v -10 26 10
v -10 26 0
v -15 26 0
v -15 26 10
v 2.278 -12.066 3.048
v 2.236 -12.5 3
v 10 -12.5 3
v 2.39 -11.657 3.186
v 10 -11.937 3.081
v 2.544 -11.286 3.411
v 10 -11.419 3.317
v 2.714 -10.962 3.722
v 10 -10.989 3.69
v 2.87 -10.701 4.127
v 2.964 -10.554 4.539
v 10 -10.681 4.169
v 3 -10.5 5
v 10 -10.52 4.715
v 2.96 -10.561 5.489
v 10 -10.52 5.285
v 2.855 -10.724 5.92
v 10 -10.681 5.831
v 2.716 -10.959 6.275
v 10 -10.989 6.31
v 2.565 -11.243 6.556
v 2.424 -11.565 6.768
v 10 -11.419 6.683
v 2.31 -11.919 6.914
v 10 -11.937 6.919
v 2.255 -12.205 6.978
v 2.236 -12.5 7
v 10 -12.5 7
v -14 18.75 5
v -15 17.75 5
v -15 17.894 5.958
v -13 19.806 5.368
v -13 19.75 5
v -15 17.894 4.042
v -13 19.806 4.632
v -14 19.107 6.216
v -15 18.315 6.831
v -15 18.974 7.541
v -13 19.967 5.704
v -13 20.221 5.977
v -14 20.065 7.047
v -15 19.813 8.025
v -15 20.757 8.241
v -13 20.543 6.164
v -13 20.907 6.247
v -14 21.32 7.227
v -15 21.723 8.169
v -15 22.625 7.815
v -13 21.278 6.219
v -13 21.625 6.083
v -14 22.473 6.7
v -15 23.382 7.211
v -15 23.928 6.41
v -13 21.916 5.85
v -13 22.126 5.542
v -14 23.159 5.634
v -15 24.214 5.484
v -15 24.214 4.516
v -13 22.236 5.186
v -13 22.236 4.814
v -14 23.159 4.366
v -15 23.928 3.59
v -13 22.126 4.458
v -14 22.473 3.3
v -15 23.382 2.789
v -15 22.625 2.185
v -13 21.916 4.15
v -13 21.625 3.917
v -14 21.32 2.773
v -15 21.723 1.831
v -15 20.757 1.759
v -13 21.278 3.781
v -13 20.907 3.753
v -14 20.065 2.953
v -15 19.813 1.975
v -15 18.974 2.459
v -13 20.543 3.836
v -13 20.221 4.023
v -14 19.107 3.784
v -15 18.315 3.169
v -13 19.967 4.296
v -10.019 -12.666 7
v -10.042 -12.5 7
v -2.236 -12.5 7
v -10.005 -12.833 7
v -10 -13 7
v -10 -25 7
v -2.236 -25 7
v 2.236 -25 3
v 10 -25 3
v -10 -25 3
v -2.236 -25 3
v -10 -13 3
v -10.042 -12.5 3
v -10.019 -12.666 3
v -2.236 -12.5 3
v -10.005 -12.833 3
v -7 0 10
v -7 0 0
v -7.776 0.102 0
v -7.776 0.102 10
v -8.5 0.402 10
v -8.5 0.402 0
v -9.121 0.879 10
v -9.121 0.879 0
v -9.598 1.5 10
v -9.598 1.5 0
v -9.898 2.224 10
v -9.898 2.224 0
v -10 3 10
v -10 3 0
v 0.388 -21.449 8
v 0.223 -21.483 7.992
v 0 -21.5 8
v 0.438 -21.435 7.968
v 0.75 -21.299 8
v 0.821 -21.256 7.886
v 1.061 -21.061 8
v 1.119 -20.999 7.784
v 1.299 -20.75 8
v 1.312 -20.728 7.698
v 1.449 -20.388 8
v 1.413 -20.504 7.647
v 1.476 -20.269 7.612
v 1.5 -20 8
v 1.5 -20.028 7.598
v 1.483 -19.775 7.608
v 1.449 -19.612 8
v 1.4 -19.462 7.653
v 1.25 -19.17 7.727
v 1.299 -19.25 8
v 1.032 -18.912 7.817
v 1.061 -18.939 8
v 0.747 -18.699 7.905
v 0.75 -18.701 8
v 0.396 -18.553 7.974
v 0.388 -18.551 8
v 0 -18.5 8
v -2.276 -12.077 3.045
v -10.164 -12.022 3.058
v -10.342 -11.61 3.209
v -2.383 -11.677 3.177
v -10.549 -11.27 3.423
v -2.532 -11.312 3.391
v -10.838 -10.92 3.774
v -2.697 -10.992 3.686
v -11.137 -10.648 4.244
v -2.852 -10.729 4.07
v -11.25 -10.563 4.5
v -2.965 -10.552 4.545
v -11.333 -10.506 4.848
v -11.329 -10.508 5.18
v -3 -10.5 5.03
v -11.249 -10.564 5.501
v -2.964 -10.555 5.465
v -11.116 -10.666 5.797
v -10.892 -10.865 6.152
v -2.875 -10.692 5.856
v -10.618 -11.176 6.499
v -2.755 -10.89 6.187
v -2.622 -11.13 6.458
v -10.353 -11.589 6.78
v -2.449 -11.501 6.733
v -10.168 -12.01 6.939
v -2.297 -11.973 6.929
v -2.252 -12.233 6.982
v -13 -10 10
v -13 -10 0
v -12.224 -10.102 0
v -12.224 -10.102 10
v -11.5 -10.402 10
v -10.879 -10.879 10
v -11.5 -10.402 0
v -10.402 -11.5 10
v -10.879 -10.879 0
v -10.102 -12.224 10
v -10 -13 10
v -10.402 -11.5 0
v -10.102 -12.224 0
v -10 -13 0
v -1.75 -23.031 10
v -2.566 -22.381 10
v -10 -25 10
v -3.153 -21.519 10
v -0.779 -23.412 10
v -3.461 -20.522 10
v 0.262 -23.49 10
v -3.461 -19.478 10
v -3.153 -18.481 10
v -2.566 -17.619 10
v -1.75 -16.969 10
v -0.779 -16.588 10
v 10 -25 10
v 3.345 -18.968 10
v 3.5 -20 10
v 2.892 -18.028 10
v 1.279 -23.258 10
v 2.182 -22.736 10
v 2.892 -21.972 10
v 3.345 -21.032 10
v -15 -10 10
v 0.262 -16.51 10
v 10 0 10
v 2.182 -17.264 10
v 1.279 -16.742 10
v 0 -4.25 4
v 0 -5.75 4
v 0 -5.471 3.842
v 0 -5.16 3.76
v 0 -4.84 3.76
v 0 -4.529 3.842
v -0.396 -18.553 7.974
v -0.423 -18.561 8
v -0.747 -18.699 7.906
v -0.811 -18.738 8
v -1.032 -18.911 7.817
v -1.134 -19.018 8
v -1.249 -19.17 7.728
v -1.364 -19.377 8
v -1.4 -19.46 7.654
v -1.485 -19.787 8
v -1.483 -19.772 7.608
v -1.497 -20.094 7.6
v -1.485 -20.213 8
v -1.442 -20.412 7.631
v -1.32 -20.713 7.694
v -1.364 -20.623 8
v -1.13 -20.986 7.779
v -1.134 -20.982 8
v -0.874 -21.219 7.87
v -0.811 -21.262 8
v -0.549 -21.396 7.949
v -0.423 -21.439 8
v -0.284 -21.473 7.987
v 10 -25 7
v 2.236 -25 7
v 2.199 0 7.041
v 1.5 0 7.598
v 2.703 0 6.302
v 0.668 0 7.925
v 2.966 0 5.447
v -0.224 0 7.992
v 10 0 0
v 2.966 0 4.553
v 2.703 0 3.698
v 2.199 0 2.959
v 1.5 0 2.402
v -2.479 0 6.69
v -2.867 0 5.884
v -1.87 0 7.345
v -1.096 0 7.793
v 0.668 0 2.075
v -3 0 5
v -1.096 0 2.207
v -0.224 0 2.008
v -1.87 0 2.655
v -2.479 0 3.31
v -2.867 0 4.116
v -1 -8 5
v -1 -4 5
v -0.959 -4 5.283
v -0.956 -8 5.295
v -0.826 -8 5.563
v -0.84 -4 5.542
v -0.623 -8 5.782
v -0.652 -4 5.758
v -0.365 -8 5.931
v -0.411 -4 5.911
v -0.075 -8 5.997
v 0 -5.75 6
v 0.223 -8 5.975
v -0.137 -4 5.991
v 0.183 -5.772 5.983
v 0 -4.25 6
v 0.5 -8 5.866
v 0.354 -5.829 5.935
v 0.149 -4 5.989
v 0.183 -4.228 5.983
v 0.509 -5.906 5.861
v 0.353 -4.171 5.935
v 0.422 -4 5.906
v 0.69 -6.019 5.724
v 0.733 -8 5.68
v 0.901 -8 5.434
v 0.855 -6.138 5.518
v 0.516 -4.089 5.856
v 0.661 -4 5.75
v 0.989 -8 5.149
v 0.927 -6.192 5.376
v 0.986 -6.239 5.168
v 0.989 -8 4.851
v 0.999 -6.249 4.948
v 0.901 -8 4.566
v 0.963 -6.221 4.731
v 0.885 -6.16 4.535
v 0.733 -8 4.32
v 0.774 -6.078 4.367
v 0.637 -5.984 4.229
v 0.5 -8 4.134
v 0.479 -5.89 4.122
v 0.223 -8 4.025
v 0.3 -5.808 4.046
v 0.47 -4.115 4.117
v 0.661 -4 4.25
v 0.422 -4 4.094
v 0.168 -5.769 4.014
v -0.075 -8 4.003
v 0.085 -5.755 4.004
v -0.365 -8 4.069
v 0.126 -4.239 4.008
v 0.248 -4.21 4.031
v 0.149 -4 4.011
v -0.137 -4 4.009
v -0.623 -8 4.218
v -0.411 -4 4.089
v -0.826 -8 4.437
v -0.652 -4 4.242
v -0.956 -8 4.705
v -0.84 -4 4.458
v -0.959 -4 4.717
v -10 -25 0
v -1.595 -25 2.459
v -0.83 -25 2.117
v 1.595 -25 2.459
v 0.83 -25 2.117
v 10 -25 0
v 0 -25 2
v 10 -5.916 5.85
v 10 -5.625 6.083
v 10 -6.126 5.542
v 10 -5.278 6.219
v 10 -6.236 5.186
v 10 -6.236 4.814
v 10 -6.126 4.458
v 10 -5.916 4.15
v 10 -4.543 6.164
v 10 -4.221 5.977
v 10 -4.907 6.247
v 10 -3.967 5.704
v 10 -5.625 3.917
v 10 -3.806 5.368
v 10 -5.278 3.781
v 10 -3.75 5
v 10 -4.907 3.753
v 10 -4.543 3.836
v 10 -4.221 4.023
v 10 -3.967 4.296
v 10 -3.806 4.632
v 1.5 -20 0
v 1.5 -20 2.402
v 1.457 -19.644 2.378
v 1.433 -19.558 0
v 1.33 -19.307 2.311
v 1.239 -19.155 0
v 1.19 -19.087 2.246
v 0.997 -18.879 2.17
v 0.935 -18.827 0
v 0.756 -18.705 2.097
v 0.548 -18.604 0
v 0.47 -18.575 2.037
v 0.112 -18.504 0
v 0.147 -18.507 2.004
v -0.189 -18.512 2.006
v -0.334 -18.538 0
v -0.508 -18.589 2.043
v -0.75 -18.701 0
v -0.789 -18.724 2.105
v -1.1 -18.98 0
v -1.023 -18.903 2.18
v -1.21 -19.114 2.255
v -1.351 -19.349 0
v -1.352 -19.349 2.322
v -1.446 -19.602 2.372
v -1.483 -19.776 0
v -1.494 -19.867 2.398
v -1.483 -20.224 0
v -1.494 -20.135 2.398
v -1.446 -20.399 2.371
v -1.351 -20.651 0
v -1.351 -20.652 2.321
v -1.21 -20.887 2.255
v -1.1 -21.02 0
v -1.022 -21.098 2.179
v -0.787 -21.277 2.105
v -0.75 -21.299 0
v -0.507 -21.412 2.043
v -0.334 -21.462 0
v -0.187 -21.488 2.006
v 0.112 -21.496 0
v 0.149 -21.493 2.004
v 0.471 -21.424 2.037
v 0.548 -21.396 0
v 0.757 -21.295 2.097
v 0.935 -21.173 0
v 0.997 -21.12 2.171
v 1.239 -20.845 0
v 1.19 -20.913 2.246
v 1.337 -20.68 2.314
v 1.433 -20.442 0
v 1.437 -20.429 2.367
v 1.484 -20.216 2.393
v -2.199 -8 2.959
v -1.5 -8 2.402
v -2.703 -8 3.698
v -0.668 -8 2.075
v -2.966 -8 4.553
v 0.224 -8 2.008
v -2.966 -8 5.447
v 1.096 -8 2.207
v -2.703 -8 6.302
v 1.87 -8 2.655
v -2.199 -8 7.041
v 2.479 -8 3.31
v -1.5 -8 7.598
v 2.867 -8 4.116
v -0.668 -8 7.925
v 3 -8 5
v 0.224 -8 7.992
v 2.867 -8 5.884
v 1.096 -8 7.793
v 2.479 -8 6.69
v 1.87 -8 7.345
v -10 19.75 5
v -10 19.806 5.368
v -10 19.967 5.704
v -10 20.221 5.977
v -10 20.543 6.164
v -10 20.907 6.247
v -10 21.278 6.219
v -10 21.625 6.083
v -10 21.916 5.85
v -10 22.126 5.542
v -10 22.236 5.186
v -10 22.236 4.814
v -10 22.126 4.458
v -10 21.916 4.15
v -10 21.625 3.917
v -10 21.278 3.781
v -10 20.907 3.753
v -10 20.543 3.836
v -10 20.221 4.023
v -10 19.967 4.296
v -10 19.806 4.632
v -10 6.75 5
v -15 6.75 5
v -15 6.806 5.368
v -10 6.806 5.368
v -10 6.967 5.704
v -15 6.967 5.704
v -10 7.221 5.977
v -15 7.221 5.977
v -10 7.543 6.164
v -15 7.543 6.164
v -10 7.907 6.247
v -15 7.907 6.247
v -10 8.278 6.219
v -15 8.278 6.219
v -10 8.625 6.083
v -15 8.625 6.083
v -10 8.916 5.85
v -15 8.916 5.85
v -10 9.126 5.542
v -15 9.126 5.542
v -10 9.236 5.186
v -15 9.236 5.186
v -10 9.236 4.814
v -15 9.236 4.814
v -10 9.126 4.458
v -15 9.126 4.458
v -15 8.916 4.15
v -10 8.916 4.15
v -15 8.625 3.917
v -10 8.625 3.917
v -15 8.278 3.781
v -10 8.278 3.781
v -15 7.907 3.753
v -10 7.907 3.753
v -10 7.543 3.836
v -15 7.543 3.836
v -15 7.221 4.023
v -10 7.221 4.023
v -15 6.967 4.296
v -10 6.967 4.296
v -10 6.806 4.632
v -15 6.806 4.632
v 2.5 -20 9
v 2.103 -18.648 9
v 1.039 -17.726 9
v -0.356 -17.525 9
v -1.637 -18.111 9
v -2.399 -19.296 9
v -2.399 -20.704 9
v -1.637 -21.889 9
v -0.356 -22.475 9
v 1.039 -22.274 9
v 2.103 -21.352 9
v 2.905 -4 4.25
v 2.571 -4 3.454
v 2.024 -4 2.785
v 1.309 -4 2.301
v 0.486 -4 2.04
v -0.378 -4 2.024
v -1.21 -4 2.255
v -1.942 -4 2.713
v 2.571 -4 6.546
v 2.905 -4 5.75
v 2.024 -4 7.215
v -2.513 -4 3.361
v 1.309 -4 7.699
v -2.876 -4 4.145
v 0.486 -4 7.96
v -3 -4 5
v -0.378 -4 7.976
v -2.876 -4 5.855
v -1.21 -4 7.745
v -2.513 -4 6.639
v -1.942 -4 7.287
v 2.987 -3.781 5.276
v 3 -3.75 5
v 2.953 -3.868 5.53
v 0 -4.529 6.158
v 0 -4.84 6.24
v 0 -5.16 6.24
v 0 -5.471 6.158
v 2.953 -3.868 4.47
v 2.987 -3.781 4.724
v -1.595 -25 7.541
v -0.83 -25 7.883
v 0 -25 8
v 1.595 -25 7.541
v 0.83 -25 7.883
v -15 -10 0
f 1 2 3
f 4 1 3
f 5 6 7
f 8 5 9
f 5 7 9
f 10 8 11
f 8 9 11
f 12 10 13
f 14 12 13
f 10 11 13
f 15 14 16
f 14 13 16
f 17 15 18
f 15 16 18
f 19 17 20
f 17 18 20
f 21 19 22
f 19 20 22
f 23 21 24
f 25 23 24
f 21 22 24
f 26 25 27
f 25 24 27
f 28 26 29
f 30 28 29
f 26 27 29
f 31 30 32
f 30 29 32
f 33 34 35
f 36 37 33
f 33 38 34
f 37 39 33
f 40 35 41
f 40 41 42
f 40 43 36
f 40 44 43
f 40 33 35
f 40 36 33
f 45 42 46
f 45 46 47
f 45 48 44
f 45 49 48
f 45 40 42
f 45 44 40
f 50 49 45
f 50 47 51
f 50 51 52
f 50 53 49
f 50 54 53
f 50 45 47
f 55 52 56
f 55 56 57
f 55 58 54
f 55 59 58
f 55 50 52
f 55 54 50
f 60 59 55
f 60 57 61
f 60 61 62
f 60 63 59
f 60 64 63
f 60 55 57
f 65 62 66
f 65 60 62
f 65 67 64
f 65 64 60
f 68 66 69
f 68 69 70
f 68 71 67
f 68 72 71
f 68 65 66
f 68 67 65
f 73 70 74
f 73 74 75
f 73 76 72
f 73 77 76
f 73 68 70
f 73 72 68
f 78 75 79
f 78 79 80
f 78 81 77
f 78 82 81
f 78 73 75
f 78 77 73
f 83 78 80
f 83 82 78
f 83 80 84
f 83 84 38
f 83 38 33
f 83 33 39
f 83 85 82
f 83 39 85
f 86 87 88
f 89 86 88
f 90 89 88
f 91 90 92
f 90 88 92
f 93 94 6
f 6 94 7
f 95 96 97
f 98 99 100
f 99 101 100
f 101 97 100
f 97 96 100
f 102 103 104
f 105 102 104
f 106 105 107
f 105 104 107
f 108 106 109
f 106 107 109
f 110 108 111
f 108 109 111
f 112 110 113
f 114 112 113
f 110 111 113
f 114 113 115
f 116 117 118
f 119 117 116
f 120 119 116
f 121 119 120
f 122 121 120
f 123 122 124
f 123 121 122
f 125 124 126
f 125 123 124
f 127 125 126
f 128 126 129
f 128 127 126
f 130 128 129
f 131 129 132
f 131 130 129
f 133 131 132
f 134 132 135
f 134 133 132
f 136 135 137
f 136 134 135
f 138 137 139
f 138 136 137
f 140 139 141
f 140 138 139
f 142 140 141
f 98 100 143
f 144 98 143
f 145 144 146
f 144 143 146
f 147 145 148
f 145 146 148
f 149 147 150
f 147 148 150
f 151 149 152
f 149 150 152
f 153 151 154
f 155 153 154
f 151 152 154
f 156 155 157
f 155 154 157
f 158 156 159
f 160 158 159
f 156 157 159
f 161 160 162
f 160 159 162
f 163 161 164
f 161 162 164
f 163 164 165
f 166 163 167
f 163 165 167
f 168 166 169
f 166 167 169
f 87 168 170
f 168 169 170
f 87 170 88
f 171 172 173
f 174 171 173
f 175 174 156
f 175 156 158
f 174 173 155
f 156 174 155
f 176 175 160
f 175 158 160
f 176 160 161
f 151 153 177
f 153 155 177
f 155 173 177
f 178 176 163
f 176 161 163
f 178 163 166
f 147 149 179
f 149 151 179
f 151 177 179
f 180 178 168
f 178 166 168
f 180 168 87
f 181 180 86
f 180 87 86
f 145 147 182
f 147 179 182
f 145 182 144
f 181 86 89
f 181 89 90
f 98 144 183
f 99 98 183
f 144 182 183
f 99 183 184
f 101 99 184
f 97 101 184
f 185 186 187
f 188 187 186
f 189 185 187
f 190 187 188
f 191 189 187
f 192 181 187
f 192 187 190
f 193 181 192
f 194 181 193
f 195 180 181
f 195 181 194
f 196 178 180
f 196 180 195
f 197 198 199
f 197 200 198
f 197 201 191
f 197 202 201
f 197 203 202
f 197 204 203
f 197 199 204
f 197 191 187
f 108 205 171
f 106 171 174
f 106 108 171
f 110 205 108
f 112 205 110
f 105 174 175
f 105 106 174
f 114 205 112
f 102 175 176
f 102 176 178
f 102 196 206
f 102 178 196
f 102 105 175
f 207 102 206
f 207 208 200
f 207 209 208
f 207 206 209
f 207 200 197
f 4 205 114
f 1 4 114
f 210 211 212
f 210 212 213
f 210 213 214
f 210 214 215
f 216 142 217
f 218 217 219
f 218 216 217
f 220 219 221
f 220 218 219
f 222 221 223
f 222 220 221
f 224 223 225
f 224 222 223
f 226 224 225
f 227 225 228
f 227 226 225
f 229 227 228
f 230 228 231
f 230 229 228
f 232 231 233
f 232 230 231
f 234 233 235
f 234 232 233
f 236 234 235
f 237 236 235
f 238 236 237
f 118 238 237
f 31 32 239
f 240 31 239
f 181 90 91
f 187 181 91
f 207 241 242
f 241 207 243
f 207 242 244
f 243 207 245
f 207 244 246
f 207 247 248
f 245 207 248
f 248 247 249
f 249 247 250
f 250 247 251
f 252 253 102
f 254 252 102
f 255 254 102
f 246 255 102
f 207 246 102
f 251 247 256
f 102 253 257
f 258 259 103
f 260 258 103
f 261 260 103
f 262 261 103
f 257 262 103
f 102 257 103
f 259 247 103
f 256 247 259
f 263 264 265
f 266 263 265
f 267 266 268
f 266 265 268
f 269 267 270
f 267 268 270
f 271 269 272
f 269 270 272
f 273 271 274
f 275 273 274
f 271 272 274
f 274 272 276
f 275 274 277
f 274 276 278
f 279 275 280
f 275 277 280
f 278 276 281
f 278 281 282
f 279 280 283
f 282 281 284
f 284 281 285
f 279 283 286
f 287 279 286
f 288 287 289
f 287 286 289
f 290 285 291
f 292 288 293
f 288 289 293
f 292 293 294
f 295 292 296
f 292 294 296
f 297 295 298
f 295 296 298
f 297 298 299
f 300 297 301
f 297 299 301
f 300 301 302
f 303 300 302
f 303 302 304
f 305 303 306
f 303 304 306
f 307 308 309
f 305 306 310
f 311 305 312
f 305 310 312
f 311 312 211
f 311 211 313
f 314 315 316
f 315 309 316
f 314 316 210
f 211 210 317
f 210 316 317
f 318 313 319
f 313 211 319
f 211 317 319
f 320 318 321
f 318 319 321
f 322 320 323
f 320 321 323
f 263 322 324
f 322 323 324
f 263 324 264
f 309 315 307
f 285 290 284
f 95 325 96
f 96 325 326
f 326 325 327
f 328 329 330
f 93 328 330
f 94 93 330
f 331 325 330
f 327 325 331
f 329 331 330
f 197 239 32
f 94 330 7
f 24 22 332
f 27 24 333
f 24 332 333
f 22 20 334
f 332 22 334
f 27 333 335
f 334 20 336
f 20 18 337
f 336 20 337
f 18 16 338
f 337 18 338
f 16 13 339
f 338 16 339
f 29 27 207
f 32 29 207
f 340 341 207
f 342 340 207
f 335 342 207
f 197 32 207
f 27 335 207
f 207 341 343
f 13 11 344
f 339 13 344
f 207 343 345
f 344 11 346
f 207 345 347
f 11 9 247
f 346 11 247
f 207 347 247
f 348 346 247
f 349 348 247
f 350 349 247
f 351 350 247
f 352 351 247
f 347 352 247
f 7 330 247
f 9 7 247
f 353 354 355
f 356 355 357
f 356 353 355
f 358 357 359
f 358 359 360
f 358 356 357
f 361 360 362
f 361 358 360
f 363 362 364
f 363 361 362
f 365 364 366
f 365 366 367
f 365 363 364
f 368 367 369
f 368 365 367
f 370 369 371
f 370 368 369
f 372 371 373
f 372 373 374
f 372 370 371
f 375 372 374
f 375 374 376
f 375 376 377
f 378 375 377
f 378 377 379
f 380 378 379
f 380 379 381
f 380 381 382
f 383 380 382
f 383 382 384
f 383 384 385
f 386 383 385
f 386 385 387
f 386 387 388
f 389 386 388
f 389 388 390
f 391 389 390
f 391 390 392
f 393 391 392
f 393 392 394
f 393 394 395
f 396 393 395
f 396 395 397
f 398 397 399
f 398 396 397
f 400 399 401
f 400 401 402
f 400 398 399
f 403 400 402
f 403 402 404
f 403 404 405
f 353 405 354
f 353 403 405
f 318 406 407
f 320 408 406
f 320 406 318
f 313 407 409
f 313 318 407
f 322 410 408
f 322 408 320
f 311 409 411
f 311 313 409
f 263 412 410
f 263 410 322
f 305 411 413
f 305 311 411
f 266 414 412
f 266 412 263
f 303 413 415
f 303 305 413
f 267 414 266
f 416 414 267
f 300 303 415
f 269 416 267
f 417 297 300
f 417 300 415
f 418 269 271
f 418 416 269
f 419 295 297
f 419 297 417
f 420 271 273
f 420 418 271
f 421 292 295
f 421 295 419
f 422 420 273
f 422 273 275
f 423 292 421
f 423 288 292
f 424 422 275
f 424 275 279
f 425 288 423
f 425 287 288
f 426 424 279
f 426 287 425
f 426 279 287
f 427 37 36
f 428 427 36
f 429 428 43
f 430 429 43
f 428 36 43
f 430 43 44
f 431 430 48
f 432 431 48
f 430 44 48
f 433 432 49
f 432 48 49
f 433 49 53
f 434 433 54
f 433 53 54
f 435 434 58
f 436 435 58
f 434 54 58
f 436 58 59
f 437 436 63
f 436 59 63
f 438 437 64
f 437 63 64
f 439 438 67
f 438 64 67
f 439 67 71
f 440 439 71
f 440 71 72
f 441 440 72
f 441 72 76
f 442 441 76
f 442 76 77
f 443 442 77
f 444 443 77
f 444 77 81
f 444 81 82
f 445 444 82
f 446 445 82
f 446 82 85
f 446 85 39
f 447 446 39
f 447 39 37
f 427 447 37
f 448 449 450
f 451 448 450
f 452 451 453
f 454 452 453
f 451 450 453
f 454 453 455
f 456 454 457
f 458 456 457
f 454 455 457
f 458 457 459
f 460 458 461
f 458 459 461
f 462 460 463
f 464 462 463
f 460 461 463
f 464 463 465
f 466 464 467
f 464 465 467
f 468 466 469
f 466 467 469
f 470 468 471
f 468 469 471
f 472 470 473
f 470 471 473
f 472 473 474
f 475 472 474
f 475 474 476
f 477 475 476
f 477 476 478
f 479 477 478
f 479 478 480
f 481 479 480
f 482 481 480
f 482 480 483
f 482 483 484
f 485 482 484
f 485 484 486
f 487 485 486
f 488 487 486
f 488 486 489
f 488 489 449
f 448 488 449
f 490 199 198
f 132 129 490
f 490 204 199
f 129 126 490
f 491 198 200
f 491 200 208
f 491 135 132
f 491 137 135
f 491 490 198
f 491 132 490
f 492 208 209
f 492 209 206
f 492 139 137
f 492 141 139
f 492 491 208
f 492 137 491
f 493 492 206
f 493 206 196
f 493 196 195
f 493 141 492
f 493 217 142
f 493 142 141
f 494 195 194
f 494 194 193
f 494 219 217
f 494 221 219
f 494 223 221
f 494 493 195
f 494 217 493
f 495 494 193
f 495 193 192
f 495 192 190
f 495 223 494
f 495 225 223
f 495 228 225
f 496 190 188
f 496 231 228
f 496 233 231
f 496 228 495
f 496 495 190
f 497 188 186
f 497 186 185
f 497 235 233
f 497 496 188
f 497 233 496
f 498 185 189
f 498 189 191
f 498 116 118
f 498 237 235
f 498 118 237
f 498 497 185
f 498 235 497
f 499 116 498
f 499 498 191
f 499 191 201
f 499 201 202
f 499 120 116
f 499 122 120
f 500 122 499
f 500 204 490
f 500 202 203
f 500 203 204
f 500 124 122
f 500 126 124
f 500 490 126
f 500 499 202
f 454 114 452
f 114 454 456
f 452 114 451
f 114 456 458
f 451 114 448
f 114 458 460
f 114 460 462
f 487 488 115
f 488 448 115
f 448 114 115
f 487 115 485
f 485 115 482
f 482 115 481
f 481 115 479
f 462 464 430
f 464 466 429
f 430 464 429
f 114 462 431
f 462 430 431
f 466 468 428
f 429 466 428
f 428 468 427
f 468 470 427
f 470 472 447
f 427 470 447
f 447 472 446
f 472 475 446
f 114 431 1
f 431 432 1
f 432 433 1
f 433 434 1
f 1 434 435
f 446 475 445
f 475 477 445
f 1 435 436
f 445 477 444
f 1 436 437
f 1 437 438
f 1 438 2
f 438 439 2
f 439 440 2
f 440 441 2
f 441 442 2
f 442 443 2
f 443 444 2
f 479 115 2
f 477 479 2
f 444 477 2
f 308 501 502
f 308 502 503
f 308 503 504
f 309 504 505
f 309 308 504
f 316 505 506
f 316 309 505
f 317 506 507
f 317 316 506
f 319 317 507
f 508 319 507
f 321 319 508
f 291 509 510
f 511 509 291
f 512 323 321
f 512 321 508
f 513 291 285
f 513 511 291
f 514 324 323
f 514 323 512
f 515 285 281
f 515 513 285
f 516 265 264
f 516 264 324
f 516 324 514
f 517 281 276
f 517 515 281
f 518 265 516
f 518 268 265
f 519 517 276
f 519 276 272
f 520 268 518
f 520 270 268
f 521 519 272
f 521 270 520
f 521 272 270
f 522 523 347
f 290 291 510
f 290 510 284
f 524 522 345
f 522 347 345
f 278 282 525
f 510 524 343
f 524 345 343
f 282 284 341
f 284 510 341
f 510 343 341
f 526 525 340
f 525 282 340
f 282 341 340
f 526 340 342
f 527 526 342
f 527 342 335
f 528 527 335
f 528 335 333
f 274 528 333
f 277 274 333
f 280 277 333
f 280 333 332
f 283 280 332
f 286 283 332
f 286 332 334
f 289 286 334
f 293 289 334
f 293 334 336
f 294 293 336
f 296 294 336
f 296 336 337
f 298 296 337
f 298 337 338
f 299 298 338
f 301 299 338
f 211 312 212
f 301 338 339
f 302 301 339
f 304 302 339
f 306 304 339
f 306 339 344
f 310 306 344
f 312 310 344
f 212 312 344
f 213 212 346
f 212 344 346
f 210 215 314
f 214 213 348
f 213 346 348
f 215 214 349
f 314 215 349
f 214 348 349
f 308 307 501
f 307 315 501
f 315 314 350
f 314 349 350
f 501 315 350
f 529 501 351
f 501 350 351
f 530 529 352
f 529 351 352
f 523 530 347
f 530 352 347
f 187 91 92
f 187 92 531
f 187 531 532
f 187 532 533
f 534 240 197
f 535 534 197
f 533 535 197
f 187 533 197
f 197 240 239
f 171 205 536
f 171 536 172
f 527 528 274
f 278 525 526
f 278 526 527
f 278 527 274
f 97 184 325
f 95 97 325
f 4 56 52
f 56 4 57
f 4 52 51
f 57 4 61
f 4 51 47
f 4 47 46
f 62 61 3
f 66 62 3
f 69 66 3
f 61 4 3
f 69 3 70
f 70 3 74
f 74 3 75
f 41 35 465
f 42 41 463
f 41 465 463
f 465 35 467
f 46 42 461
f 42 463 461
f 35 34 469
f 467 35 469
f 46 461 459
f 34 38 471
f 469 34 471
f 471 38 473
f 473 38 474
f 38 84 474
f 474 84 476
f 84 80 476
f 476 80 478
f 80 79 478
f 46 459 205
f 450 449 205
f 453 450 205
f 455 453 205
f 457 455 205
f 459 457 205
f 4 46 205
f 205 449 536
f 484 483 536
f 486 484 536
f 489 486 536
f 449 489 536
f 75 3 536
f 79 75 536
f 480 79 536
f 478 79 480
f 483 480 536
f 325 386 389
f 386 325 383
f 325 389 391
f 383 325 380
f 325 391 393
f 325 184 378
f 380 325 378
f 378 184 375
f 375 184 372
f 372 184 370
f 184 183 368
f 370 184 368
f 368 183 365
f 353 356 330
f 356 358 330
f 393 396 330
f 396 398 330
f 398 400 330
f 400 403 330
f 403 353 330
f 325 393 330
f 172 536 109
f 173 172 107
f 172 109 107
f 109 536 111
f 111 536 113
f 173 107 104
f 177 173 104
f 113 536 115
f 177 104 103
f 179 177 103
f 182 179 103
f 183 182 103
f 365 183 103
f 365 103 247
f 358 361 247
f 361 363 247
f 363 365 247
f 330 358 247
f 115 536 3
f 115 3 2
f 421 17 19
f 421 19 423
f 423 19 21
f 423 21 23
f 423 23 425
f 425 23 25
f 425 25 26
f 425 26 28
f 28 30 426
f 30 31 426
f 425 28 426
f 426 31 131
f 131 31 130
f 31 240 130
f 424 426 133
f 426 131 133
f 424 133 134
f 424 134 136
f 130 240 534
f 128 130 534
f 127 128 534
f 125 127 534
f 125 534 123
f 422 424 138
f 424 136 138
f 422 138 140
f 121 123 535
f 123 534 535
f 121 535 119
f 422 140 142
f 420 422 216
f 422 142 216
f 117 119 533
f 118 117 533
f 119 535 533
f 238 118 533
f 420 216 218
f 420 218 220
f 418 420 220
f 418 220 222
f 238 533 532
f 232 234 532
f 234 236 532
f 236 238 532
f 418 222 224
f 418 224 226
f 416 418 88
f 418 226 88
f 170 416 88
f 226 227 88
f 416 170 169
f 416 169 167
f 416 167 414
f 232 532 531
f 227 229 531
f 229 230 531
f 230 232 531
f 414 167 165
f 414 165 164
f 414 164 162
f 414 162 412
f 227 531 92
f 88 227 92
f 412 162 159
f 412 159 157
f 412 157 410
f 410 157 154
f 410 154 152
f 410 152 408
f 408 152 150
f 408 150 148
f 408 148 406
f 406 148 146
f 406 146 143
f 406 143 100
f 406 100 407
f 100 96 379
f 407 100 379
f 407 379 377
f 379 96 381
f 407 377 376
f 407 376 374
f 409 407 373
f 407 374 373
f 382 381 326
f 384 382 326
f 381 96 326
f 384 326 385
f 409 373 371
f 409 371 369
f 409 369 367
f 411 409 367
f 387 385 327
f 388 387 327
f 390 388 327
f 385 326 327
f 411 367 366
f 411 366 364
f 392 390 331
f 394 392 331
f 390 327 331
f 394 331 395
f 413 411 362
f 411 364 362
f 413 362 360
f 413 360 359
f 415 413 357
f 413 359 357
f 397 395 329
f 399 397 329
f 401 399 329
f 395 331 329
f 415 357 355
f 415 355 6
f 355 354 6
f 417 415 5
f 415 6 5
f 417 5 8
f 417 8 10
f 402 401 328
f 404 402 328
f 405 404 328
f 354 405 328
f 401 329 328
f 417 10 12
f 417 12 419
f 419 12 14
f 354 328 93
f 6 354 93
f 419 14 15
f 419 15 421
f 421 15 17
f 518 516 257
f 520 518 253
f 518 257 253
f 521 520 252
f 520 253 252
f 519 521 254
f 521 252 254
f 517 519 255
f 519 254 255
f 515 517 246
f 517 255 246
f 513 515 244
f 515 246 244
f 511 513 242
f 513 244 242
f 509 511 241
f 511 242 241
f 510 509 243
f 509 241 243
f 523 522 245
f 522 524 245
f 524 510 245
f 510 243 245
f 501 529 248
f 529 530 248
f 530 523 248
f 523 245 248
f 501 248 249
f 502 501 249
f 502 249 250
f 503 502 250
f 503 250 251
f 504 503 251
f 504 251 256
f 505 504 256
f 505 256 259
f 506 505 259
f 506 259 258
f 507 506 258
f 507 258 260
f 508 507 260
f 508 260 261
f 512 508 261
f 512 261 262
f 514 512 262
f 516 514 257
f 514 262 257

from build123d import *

# Parameters (mm, degrees)
F0_R      = 1.5
F1_DEPTH  = 10
F3_DEPTH  = 25.001001
F4_R      = 1.25
F5_DEPTH  = 25.001001
F6_R      = 1
F7_DEPTH  = 25.001
F6_R_2    = 3
F8_DEPTH  = 4
F2_R      = 1.25
F9_DEPTH  = 10
F10_SIZE  = 2
F11_R     = 3
F12_DEPTH = 17


with BuildPart() as f1:
    # F0 (on Top) → F1 (new body)
    with BuildSketch(Plane.XY):
        Polygon((10.000001, -25), (10.000001, 0), (-7, 0), (-10, 0), (-10, 3), (-10, 26), (-15, 26), (-15, -10), (-13, -10), (-10, -10), (-10, -13), (-10, -25), align=None)
        with Locations((0, -20)):
            Circle(F0_R, mode=Mode.SUBTRACT)
        with BuildLine():
            ThreePointArc((-13, -10), (-10.87868, -10.87868), (-10, -13))
            Line((-10, -13), (-10, -10))
            Line((-10, -10), (-13, -10))
        make_face()
        with BuildLine():
            Line((-10, 0), (-7, 0))
            ThreePointArc((-7, 0), (-9.12132, 0.87868), (-10, 3))
            Line((-10, 3), (-10, 0))
        make_face()
    extrude(amount=F1_DEPTH)

    # F2 (on face) → F3 (cut, through all)
    with BuildSketch(Plane.YZ.offset(10.000001)):
        with BuildLine():
            Line((-12.5, 7), (-25, 7))
            Line((-25, 7), (-25, 3))
            Line((-25, 3), (-12.5, 3))
            ThreePointArc((-12.5, 3), (-10.5, 5), (-12.5, 7))
        make_face()
    extrude(amount=-F3_DEPTH, mode=Mode.SUBTRACT)

    # F4 (on face) → F5 (cut, through all)
    with BuildSketch(Plane(origin=(-15, 0, 0), x_dir=(0, -1, 0), z_dir=(-1, 0, 0))):
        with Locations((-8, 5)):
            Circle(F4_R)
        with Locations((-21, 5)):
            Circle(F4_R)
    extrude(amount=-F5_DEPTH, mode=Mode.SUBTRACT)

    # F6 (on face) → F7 (cut, through all)
    with BuildSketch(Plane(origin=(0, 0, 0), x_dir=(-1, 0, 0), z_dir=(0, 1, 0))):
        with Locations((0, 5)):
            Circle(F6_R)
    extrude(amount=-F7_DEPTH, mode=Mode.SUBTRACT)

    # F6 (on face) → F8 (cut)
    with BuildSketch(Plane(origin=(0, 0, 0), x_dir=(-1, 0, 0), z_dir=(0, 1, 0))):
        with Locations((0, 5)):
            Circle(F6_R_2)
        with Locations((0, 5)):
            Circle(F6_R, mode=Mode.SUBTRACT)
    extrude(amount=-F8_DEPTH, mode=Mode.SUBTRACT)

    # F2 (on face) → F9 (cut)
    with BuildSketch(Plane.YZ.offset(10.000001)):
        with Locations((-5, 5)):
            Circle(F2_R)
    extrude(amount=-F9_DEPTH, mode=Mode.SUBTRACT)

    # F10
    f10_edges = [f1.edges().sort_by_distance(p)[0] for p in [
        (-1.5, -20, 10),
        (-15, 22.25, 5),
    ]]
    chamfer(f10_edges, length=F10_SIZE)

    # F11 (on face) → F12 (cut)
    with BuildSketch(Plane.XZ.offset(25)):
        with Locations((0, 5)):
            Circle(F11_R)
    extrude(amount=-F12_DEPTH, mode=Mode.SUBTRACT)


solid = f1.part
